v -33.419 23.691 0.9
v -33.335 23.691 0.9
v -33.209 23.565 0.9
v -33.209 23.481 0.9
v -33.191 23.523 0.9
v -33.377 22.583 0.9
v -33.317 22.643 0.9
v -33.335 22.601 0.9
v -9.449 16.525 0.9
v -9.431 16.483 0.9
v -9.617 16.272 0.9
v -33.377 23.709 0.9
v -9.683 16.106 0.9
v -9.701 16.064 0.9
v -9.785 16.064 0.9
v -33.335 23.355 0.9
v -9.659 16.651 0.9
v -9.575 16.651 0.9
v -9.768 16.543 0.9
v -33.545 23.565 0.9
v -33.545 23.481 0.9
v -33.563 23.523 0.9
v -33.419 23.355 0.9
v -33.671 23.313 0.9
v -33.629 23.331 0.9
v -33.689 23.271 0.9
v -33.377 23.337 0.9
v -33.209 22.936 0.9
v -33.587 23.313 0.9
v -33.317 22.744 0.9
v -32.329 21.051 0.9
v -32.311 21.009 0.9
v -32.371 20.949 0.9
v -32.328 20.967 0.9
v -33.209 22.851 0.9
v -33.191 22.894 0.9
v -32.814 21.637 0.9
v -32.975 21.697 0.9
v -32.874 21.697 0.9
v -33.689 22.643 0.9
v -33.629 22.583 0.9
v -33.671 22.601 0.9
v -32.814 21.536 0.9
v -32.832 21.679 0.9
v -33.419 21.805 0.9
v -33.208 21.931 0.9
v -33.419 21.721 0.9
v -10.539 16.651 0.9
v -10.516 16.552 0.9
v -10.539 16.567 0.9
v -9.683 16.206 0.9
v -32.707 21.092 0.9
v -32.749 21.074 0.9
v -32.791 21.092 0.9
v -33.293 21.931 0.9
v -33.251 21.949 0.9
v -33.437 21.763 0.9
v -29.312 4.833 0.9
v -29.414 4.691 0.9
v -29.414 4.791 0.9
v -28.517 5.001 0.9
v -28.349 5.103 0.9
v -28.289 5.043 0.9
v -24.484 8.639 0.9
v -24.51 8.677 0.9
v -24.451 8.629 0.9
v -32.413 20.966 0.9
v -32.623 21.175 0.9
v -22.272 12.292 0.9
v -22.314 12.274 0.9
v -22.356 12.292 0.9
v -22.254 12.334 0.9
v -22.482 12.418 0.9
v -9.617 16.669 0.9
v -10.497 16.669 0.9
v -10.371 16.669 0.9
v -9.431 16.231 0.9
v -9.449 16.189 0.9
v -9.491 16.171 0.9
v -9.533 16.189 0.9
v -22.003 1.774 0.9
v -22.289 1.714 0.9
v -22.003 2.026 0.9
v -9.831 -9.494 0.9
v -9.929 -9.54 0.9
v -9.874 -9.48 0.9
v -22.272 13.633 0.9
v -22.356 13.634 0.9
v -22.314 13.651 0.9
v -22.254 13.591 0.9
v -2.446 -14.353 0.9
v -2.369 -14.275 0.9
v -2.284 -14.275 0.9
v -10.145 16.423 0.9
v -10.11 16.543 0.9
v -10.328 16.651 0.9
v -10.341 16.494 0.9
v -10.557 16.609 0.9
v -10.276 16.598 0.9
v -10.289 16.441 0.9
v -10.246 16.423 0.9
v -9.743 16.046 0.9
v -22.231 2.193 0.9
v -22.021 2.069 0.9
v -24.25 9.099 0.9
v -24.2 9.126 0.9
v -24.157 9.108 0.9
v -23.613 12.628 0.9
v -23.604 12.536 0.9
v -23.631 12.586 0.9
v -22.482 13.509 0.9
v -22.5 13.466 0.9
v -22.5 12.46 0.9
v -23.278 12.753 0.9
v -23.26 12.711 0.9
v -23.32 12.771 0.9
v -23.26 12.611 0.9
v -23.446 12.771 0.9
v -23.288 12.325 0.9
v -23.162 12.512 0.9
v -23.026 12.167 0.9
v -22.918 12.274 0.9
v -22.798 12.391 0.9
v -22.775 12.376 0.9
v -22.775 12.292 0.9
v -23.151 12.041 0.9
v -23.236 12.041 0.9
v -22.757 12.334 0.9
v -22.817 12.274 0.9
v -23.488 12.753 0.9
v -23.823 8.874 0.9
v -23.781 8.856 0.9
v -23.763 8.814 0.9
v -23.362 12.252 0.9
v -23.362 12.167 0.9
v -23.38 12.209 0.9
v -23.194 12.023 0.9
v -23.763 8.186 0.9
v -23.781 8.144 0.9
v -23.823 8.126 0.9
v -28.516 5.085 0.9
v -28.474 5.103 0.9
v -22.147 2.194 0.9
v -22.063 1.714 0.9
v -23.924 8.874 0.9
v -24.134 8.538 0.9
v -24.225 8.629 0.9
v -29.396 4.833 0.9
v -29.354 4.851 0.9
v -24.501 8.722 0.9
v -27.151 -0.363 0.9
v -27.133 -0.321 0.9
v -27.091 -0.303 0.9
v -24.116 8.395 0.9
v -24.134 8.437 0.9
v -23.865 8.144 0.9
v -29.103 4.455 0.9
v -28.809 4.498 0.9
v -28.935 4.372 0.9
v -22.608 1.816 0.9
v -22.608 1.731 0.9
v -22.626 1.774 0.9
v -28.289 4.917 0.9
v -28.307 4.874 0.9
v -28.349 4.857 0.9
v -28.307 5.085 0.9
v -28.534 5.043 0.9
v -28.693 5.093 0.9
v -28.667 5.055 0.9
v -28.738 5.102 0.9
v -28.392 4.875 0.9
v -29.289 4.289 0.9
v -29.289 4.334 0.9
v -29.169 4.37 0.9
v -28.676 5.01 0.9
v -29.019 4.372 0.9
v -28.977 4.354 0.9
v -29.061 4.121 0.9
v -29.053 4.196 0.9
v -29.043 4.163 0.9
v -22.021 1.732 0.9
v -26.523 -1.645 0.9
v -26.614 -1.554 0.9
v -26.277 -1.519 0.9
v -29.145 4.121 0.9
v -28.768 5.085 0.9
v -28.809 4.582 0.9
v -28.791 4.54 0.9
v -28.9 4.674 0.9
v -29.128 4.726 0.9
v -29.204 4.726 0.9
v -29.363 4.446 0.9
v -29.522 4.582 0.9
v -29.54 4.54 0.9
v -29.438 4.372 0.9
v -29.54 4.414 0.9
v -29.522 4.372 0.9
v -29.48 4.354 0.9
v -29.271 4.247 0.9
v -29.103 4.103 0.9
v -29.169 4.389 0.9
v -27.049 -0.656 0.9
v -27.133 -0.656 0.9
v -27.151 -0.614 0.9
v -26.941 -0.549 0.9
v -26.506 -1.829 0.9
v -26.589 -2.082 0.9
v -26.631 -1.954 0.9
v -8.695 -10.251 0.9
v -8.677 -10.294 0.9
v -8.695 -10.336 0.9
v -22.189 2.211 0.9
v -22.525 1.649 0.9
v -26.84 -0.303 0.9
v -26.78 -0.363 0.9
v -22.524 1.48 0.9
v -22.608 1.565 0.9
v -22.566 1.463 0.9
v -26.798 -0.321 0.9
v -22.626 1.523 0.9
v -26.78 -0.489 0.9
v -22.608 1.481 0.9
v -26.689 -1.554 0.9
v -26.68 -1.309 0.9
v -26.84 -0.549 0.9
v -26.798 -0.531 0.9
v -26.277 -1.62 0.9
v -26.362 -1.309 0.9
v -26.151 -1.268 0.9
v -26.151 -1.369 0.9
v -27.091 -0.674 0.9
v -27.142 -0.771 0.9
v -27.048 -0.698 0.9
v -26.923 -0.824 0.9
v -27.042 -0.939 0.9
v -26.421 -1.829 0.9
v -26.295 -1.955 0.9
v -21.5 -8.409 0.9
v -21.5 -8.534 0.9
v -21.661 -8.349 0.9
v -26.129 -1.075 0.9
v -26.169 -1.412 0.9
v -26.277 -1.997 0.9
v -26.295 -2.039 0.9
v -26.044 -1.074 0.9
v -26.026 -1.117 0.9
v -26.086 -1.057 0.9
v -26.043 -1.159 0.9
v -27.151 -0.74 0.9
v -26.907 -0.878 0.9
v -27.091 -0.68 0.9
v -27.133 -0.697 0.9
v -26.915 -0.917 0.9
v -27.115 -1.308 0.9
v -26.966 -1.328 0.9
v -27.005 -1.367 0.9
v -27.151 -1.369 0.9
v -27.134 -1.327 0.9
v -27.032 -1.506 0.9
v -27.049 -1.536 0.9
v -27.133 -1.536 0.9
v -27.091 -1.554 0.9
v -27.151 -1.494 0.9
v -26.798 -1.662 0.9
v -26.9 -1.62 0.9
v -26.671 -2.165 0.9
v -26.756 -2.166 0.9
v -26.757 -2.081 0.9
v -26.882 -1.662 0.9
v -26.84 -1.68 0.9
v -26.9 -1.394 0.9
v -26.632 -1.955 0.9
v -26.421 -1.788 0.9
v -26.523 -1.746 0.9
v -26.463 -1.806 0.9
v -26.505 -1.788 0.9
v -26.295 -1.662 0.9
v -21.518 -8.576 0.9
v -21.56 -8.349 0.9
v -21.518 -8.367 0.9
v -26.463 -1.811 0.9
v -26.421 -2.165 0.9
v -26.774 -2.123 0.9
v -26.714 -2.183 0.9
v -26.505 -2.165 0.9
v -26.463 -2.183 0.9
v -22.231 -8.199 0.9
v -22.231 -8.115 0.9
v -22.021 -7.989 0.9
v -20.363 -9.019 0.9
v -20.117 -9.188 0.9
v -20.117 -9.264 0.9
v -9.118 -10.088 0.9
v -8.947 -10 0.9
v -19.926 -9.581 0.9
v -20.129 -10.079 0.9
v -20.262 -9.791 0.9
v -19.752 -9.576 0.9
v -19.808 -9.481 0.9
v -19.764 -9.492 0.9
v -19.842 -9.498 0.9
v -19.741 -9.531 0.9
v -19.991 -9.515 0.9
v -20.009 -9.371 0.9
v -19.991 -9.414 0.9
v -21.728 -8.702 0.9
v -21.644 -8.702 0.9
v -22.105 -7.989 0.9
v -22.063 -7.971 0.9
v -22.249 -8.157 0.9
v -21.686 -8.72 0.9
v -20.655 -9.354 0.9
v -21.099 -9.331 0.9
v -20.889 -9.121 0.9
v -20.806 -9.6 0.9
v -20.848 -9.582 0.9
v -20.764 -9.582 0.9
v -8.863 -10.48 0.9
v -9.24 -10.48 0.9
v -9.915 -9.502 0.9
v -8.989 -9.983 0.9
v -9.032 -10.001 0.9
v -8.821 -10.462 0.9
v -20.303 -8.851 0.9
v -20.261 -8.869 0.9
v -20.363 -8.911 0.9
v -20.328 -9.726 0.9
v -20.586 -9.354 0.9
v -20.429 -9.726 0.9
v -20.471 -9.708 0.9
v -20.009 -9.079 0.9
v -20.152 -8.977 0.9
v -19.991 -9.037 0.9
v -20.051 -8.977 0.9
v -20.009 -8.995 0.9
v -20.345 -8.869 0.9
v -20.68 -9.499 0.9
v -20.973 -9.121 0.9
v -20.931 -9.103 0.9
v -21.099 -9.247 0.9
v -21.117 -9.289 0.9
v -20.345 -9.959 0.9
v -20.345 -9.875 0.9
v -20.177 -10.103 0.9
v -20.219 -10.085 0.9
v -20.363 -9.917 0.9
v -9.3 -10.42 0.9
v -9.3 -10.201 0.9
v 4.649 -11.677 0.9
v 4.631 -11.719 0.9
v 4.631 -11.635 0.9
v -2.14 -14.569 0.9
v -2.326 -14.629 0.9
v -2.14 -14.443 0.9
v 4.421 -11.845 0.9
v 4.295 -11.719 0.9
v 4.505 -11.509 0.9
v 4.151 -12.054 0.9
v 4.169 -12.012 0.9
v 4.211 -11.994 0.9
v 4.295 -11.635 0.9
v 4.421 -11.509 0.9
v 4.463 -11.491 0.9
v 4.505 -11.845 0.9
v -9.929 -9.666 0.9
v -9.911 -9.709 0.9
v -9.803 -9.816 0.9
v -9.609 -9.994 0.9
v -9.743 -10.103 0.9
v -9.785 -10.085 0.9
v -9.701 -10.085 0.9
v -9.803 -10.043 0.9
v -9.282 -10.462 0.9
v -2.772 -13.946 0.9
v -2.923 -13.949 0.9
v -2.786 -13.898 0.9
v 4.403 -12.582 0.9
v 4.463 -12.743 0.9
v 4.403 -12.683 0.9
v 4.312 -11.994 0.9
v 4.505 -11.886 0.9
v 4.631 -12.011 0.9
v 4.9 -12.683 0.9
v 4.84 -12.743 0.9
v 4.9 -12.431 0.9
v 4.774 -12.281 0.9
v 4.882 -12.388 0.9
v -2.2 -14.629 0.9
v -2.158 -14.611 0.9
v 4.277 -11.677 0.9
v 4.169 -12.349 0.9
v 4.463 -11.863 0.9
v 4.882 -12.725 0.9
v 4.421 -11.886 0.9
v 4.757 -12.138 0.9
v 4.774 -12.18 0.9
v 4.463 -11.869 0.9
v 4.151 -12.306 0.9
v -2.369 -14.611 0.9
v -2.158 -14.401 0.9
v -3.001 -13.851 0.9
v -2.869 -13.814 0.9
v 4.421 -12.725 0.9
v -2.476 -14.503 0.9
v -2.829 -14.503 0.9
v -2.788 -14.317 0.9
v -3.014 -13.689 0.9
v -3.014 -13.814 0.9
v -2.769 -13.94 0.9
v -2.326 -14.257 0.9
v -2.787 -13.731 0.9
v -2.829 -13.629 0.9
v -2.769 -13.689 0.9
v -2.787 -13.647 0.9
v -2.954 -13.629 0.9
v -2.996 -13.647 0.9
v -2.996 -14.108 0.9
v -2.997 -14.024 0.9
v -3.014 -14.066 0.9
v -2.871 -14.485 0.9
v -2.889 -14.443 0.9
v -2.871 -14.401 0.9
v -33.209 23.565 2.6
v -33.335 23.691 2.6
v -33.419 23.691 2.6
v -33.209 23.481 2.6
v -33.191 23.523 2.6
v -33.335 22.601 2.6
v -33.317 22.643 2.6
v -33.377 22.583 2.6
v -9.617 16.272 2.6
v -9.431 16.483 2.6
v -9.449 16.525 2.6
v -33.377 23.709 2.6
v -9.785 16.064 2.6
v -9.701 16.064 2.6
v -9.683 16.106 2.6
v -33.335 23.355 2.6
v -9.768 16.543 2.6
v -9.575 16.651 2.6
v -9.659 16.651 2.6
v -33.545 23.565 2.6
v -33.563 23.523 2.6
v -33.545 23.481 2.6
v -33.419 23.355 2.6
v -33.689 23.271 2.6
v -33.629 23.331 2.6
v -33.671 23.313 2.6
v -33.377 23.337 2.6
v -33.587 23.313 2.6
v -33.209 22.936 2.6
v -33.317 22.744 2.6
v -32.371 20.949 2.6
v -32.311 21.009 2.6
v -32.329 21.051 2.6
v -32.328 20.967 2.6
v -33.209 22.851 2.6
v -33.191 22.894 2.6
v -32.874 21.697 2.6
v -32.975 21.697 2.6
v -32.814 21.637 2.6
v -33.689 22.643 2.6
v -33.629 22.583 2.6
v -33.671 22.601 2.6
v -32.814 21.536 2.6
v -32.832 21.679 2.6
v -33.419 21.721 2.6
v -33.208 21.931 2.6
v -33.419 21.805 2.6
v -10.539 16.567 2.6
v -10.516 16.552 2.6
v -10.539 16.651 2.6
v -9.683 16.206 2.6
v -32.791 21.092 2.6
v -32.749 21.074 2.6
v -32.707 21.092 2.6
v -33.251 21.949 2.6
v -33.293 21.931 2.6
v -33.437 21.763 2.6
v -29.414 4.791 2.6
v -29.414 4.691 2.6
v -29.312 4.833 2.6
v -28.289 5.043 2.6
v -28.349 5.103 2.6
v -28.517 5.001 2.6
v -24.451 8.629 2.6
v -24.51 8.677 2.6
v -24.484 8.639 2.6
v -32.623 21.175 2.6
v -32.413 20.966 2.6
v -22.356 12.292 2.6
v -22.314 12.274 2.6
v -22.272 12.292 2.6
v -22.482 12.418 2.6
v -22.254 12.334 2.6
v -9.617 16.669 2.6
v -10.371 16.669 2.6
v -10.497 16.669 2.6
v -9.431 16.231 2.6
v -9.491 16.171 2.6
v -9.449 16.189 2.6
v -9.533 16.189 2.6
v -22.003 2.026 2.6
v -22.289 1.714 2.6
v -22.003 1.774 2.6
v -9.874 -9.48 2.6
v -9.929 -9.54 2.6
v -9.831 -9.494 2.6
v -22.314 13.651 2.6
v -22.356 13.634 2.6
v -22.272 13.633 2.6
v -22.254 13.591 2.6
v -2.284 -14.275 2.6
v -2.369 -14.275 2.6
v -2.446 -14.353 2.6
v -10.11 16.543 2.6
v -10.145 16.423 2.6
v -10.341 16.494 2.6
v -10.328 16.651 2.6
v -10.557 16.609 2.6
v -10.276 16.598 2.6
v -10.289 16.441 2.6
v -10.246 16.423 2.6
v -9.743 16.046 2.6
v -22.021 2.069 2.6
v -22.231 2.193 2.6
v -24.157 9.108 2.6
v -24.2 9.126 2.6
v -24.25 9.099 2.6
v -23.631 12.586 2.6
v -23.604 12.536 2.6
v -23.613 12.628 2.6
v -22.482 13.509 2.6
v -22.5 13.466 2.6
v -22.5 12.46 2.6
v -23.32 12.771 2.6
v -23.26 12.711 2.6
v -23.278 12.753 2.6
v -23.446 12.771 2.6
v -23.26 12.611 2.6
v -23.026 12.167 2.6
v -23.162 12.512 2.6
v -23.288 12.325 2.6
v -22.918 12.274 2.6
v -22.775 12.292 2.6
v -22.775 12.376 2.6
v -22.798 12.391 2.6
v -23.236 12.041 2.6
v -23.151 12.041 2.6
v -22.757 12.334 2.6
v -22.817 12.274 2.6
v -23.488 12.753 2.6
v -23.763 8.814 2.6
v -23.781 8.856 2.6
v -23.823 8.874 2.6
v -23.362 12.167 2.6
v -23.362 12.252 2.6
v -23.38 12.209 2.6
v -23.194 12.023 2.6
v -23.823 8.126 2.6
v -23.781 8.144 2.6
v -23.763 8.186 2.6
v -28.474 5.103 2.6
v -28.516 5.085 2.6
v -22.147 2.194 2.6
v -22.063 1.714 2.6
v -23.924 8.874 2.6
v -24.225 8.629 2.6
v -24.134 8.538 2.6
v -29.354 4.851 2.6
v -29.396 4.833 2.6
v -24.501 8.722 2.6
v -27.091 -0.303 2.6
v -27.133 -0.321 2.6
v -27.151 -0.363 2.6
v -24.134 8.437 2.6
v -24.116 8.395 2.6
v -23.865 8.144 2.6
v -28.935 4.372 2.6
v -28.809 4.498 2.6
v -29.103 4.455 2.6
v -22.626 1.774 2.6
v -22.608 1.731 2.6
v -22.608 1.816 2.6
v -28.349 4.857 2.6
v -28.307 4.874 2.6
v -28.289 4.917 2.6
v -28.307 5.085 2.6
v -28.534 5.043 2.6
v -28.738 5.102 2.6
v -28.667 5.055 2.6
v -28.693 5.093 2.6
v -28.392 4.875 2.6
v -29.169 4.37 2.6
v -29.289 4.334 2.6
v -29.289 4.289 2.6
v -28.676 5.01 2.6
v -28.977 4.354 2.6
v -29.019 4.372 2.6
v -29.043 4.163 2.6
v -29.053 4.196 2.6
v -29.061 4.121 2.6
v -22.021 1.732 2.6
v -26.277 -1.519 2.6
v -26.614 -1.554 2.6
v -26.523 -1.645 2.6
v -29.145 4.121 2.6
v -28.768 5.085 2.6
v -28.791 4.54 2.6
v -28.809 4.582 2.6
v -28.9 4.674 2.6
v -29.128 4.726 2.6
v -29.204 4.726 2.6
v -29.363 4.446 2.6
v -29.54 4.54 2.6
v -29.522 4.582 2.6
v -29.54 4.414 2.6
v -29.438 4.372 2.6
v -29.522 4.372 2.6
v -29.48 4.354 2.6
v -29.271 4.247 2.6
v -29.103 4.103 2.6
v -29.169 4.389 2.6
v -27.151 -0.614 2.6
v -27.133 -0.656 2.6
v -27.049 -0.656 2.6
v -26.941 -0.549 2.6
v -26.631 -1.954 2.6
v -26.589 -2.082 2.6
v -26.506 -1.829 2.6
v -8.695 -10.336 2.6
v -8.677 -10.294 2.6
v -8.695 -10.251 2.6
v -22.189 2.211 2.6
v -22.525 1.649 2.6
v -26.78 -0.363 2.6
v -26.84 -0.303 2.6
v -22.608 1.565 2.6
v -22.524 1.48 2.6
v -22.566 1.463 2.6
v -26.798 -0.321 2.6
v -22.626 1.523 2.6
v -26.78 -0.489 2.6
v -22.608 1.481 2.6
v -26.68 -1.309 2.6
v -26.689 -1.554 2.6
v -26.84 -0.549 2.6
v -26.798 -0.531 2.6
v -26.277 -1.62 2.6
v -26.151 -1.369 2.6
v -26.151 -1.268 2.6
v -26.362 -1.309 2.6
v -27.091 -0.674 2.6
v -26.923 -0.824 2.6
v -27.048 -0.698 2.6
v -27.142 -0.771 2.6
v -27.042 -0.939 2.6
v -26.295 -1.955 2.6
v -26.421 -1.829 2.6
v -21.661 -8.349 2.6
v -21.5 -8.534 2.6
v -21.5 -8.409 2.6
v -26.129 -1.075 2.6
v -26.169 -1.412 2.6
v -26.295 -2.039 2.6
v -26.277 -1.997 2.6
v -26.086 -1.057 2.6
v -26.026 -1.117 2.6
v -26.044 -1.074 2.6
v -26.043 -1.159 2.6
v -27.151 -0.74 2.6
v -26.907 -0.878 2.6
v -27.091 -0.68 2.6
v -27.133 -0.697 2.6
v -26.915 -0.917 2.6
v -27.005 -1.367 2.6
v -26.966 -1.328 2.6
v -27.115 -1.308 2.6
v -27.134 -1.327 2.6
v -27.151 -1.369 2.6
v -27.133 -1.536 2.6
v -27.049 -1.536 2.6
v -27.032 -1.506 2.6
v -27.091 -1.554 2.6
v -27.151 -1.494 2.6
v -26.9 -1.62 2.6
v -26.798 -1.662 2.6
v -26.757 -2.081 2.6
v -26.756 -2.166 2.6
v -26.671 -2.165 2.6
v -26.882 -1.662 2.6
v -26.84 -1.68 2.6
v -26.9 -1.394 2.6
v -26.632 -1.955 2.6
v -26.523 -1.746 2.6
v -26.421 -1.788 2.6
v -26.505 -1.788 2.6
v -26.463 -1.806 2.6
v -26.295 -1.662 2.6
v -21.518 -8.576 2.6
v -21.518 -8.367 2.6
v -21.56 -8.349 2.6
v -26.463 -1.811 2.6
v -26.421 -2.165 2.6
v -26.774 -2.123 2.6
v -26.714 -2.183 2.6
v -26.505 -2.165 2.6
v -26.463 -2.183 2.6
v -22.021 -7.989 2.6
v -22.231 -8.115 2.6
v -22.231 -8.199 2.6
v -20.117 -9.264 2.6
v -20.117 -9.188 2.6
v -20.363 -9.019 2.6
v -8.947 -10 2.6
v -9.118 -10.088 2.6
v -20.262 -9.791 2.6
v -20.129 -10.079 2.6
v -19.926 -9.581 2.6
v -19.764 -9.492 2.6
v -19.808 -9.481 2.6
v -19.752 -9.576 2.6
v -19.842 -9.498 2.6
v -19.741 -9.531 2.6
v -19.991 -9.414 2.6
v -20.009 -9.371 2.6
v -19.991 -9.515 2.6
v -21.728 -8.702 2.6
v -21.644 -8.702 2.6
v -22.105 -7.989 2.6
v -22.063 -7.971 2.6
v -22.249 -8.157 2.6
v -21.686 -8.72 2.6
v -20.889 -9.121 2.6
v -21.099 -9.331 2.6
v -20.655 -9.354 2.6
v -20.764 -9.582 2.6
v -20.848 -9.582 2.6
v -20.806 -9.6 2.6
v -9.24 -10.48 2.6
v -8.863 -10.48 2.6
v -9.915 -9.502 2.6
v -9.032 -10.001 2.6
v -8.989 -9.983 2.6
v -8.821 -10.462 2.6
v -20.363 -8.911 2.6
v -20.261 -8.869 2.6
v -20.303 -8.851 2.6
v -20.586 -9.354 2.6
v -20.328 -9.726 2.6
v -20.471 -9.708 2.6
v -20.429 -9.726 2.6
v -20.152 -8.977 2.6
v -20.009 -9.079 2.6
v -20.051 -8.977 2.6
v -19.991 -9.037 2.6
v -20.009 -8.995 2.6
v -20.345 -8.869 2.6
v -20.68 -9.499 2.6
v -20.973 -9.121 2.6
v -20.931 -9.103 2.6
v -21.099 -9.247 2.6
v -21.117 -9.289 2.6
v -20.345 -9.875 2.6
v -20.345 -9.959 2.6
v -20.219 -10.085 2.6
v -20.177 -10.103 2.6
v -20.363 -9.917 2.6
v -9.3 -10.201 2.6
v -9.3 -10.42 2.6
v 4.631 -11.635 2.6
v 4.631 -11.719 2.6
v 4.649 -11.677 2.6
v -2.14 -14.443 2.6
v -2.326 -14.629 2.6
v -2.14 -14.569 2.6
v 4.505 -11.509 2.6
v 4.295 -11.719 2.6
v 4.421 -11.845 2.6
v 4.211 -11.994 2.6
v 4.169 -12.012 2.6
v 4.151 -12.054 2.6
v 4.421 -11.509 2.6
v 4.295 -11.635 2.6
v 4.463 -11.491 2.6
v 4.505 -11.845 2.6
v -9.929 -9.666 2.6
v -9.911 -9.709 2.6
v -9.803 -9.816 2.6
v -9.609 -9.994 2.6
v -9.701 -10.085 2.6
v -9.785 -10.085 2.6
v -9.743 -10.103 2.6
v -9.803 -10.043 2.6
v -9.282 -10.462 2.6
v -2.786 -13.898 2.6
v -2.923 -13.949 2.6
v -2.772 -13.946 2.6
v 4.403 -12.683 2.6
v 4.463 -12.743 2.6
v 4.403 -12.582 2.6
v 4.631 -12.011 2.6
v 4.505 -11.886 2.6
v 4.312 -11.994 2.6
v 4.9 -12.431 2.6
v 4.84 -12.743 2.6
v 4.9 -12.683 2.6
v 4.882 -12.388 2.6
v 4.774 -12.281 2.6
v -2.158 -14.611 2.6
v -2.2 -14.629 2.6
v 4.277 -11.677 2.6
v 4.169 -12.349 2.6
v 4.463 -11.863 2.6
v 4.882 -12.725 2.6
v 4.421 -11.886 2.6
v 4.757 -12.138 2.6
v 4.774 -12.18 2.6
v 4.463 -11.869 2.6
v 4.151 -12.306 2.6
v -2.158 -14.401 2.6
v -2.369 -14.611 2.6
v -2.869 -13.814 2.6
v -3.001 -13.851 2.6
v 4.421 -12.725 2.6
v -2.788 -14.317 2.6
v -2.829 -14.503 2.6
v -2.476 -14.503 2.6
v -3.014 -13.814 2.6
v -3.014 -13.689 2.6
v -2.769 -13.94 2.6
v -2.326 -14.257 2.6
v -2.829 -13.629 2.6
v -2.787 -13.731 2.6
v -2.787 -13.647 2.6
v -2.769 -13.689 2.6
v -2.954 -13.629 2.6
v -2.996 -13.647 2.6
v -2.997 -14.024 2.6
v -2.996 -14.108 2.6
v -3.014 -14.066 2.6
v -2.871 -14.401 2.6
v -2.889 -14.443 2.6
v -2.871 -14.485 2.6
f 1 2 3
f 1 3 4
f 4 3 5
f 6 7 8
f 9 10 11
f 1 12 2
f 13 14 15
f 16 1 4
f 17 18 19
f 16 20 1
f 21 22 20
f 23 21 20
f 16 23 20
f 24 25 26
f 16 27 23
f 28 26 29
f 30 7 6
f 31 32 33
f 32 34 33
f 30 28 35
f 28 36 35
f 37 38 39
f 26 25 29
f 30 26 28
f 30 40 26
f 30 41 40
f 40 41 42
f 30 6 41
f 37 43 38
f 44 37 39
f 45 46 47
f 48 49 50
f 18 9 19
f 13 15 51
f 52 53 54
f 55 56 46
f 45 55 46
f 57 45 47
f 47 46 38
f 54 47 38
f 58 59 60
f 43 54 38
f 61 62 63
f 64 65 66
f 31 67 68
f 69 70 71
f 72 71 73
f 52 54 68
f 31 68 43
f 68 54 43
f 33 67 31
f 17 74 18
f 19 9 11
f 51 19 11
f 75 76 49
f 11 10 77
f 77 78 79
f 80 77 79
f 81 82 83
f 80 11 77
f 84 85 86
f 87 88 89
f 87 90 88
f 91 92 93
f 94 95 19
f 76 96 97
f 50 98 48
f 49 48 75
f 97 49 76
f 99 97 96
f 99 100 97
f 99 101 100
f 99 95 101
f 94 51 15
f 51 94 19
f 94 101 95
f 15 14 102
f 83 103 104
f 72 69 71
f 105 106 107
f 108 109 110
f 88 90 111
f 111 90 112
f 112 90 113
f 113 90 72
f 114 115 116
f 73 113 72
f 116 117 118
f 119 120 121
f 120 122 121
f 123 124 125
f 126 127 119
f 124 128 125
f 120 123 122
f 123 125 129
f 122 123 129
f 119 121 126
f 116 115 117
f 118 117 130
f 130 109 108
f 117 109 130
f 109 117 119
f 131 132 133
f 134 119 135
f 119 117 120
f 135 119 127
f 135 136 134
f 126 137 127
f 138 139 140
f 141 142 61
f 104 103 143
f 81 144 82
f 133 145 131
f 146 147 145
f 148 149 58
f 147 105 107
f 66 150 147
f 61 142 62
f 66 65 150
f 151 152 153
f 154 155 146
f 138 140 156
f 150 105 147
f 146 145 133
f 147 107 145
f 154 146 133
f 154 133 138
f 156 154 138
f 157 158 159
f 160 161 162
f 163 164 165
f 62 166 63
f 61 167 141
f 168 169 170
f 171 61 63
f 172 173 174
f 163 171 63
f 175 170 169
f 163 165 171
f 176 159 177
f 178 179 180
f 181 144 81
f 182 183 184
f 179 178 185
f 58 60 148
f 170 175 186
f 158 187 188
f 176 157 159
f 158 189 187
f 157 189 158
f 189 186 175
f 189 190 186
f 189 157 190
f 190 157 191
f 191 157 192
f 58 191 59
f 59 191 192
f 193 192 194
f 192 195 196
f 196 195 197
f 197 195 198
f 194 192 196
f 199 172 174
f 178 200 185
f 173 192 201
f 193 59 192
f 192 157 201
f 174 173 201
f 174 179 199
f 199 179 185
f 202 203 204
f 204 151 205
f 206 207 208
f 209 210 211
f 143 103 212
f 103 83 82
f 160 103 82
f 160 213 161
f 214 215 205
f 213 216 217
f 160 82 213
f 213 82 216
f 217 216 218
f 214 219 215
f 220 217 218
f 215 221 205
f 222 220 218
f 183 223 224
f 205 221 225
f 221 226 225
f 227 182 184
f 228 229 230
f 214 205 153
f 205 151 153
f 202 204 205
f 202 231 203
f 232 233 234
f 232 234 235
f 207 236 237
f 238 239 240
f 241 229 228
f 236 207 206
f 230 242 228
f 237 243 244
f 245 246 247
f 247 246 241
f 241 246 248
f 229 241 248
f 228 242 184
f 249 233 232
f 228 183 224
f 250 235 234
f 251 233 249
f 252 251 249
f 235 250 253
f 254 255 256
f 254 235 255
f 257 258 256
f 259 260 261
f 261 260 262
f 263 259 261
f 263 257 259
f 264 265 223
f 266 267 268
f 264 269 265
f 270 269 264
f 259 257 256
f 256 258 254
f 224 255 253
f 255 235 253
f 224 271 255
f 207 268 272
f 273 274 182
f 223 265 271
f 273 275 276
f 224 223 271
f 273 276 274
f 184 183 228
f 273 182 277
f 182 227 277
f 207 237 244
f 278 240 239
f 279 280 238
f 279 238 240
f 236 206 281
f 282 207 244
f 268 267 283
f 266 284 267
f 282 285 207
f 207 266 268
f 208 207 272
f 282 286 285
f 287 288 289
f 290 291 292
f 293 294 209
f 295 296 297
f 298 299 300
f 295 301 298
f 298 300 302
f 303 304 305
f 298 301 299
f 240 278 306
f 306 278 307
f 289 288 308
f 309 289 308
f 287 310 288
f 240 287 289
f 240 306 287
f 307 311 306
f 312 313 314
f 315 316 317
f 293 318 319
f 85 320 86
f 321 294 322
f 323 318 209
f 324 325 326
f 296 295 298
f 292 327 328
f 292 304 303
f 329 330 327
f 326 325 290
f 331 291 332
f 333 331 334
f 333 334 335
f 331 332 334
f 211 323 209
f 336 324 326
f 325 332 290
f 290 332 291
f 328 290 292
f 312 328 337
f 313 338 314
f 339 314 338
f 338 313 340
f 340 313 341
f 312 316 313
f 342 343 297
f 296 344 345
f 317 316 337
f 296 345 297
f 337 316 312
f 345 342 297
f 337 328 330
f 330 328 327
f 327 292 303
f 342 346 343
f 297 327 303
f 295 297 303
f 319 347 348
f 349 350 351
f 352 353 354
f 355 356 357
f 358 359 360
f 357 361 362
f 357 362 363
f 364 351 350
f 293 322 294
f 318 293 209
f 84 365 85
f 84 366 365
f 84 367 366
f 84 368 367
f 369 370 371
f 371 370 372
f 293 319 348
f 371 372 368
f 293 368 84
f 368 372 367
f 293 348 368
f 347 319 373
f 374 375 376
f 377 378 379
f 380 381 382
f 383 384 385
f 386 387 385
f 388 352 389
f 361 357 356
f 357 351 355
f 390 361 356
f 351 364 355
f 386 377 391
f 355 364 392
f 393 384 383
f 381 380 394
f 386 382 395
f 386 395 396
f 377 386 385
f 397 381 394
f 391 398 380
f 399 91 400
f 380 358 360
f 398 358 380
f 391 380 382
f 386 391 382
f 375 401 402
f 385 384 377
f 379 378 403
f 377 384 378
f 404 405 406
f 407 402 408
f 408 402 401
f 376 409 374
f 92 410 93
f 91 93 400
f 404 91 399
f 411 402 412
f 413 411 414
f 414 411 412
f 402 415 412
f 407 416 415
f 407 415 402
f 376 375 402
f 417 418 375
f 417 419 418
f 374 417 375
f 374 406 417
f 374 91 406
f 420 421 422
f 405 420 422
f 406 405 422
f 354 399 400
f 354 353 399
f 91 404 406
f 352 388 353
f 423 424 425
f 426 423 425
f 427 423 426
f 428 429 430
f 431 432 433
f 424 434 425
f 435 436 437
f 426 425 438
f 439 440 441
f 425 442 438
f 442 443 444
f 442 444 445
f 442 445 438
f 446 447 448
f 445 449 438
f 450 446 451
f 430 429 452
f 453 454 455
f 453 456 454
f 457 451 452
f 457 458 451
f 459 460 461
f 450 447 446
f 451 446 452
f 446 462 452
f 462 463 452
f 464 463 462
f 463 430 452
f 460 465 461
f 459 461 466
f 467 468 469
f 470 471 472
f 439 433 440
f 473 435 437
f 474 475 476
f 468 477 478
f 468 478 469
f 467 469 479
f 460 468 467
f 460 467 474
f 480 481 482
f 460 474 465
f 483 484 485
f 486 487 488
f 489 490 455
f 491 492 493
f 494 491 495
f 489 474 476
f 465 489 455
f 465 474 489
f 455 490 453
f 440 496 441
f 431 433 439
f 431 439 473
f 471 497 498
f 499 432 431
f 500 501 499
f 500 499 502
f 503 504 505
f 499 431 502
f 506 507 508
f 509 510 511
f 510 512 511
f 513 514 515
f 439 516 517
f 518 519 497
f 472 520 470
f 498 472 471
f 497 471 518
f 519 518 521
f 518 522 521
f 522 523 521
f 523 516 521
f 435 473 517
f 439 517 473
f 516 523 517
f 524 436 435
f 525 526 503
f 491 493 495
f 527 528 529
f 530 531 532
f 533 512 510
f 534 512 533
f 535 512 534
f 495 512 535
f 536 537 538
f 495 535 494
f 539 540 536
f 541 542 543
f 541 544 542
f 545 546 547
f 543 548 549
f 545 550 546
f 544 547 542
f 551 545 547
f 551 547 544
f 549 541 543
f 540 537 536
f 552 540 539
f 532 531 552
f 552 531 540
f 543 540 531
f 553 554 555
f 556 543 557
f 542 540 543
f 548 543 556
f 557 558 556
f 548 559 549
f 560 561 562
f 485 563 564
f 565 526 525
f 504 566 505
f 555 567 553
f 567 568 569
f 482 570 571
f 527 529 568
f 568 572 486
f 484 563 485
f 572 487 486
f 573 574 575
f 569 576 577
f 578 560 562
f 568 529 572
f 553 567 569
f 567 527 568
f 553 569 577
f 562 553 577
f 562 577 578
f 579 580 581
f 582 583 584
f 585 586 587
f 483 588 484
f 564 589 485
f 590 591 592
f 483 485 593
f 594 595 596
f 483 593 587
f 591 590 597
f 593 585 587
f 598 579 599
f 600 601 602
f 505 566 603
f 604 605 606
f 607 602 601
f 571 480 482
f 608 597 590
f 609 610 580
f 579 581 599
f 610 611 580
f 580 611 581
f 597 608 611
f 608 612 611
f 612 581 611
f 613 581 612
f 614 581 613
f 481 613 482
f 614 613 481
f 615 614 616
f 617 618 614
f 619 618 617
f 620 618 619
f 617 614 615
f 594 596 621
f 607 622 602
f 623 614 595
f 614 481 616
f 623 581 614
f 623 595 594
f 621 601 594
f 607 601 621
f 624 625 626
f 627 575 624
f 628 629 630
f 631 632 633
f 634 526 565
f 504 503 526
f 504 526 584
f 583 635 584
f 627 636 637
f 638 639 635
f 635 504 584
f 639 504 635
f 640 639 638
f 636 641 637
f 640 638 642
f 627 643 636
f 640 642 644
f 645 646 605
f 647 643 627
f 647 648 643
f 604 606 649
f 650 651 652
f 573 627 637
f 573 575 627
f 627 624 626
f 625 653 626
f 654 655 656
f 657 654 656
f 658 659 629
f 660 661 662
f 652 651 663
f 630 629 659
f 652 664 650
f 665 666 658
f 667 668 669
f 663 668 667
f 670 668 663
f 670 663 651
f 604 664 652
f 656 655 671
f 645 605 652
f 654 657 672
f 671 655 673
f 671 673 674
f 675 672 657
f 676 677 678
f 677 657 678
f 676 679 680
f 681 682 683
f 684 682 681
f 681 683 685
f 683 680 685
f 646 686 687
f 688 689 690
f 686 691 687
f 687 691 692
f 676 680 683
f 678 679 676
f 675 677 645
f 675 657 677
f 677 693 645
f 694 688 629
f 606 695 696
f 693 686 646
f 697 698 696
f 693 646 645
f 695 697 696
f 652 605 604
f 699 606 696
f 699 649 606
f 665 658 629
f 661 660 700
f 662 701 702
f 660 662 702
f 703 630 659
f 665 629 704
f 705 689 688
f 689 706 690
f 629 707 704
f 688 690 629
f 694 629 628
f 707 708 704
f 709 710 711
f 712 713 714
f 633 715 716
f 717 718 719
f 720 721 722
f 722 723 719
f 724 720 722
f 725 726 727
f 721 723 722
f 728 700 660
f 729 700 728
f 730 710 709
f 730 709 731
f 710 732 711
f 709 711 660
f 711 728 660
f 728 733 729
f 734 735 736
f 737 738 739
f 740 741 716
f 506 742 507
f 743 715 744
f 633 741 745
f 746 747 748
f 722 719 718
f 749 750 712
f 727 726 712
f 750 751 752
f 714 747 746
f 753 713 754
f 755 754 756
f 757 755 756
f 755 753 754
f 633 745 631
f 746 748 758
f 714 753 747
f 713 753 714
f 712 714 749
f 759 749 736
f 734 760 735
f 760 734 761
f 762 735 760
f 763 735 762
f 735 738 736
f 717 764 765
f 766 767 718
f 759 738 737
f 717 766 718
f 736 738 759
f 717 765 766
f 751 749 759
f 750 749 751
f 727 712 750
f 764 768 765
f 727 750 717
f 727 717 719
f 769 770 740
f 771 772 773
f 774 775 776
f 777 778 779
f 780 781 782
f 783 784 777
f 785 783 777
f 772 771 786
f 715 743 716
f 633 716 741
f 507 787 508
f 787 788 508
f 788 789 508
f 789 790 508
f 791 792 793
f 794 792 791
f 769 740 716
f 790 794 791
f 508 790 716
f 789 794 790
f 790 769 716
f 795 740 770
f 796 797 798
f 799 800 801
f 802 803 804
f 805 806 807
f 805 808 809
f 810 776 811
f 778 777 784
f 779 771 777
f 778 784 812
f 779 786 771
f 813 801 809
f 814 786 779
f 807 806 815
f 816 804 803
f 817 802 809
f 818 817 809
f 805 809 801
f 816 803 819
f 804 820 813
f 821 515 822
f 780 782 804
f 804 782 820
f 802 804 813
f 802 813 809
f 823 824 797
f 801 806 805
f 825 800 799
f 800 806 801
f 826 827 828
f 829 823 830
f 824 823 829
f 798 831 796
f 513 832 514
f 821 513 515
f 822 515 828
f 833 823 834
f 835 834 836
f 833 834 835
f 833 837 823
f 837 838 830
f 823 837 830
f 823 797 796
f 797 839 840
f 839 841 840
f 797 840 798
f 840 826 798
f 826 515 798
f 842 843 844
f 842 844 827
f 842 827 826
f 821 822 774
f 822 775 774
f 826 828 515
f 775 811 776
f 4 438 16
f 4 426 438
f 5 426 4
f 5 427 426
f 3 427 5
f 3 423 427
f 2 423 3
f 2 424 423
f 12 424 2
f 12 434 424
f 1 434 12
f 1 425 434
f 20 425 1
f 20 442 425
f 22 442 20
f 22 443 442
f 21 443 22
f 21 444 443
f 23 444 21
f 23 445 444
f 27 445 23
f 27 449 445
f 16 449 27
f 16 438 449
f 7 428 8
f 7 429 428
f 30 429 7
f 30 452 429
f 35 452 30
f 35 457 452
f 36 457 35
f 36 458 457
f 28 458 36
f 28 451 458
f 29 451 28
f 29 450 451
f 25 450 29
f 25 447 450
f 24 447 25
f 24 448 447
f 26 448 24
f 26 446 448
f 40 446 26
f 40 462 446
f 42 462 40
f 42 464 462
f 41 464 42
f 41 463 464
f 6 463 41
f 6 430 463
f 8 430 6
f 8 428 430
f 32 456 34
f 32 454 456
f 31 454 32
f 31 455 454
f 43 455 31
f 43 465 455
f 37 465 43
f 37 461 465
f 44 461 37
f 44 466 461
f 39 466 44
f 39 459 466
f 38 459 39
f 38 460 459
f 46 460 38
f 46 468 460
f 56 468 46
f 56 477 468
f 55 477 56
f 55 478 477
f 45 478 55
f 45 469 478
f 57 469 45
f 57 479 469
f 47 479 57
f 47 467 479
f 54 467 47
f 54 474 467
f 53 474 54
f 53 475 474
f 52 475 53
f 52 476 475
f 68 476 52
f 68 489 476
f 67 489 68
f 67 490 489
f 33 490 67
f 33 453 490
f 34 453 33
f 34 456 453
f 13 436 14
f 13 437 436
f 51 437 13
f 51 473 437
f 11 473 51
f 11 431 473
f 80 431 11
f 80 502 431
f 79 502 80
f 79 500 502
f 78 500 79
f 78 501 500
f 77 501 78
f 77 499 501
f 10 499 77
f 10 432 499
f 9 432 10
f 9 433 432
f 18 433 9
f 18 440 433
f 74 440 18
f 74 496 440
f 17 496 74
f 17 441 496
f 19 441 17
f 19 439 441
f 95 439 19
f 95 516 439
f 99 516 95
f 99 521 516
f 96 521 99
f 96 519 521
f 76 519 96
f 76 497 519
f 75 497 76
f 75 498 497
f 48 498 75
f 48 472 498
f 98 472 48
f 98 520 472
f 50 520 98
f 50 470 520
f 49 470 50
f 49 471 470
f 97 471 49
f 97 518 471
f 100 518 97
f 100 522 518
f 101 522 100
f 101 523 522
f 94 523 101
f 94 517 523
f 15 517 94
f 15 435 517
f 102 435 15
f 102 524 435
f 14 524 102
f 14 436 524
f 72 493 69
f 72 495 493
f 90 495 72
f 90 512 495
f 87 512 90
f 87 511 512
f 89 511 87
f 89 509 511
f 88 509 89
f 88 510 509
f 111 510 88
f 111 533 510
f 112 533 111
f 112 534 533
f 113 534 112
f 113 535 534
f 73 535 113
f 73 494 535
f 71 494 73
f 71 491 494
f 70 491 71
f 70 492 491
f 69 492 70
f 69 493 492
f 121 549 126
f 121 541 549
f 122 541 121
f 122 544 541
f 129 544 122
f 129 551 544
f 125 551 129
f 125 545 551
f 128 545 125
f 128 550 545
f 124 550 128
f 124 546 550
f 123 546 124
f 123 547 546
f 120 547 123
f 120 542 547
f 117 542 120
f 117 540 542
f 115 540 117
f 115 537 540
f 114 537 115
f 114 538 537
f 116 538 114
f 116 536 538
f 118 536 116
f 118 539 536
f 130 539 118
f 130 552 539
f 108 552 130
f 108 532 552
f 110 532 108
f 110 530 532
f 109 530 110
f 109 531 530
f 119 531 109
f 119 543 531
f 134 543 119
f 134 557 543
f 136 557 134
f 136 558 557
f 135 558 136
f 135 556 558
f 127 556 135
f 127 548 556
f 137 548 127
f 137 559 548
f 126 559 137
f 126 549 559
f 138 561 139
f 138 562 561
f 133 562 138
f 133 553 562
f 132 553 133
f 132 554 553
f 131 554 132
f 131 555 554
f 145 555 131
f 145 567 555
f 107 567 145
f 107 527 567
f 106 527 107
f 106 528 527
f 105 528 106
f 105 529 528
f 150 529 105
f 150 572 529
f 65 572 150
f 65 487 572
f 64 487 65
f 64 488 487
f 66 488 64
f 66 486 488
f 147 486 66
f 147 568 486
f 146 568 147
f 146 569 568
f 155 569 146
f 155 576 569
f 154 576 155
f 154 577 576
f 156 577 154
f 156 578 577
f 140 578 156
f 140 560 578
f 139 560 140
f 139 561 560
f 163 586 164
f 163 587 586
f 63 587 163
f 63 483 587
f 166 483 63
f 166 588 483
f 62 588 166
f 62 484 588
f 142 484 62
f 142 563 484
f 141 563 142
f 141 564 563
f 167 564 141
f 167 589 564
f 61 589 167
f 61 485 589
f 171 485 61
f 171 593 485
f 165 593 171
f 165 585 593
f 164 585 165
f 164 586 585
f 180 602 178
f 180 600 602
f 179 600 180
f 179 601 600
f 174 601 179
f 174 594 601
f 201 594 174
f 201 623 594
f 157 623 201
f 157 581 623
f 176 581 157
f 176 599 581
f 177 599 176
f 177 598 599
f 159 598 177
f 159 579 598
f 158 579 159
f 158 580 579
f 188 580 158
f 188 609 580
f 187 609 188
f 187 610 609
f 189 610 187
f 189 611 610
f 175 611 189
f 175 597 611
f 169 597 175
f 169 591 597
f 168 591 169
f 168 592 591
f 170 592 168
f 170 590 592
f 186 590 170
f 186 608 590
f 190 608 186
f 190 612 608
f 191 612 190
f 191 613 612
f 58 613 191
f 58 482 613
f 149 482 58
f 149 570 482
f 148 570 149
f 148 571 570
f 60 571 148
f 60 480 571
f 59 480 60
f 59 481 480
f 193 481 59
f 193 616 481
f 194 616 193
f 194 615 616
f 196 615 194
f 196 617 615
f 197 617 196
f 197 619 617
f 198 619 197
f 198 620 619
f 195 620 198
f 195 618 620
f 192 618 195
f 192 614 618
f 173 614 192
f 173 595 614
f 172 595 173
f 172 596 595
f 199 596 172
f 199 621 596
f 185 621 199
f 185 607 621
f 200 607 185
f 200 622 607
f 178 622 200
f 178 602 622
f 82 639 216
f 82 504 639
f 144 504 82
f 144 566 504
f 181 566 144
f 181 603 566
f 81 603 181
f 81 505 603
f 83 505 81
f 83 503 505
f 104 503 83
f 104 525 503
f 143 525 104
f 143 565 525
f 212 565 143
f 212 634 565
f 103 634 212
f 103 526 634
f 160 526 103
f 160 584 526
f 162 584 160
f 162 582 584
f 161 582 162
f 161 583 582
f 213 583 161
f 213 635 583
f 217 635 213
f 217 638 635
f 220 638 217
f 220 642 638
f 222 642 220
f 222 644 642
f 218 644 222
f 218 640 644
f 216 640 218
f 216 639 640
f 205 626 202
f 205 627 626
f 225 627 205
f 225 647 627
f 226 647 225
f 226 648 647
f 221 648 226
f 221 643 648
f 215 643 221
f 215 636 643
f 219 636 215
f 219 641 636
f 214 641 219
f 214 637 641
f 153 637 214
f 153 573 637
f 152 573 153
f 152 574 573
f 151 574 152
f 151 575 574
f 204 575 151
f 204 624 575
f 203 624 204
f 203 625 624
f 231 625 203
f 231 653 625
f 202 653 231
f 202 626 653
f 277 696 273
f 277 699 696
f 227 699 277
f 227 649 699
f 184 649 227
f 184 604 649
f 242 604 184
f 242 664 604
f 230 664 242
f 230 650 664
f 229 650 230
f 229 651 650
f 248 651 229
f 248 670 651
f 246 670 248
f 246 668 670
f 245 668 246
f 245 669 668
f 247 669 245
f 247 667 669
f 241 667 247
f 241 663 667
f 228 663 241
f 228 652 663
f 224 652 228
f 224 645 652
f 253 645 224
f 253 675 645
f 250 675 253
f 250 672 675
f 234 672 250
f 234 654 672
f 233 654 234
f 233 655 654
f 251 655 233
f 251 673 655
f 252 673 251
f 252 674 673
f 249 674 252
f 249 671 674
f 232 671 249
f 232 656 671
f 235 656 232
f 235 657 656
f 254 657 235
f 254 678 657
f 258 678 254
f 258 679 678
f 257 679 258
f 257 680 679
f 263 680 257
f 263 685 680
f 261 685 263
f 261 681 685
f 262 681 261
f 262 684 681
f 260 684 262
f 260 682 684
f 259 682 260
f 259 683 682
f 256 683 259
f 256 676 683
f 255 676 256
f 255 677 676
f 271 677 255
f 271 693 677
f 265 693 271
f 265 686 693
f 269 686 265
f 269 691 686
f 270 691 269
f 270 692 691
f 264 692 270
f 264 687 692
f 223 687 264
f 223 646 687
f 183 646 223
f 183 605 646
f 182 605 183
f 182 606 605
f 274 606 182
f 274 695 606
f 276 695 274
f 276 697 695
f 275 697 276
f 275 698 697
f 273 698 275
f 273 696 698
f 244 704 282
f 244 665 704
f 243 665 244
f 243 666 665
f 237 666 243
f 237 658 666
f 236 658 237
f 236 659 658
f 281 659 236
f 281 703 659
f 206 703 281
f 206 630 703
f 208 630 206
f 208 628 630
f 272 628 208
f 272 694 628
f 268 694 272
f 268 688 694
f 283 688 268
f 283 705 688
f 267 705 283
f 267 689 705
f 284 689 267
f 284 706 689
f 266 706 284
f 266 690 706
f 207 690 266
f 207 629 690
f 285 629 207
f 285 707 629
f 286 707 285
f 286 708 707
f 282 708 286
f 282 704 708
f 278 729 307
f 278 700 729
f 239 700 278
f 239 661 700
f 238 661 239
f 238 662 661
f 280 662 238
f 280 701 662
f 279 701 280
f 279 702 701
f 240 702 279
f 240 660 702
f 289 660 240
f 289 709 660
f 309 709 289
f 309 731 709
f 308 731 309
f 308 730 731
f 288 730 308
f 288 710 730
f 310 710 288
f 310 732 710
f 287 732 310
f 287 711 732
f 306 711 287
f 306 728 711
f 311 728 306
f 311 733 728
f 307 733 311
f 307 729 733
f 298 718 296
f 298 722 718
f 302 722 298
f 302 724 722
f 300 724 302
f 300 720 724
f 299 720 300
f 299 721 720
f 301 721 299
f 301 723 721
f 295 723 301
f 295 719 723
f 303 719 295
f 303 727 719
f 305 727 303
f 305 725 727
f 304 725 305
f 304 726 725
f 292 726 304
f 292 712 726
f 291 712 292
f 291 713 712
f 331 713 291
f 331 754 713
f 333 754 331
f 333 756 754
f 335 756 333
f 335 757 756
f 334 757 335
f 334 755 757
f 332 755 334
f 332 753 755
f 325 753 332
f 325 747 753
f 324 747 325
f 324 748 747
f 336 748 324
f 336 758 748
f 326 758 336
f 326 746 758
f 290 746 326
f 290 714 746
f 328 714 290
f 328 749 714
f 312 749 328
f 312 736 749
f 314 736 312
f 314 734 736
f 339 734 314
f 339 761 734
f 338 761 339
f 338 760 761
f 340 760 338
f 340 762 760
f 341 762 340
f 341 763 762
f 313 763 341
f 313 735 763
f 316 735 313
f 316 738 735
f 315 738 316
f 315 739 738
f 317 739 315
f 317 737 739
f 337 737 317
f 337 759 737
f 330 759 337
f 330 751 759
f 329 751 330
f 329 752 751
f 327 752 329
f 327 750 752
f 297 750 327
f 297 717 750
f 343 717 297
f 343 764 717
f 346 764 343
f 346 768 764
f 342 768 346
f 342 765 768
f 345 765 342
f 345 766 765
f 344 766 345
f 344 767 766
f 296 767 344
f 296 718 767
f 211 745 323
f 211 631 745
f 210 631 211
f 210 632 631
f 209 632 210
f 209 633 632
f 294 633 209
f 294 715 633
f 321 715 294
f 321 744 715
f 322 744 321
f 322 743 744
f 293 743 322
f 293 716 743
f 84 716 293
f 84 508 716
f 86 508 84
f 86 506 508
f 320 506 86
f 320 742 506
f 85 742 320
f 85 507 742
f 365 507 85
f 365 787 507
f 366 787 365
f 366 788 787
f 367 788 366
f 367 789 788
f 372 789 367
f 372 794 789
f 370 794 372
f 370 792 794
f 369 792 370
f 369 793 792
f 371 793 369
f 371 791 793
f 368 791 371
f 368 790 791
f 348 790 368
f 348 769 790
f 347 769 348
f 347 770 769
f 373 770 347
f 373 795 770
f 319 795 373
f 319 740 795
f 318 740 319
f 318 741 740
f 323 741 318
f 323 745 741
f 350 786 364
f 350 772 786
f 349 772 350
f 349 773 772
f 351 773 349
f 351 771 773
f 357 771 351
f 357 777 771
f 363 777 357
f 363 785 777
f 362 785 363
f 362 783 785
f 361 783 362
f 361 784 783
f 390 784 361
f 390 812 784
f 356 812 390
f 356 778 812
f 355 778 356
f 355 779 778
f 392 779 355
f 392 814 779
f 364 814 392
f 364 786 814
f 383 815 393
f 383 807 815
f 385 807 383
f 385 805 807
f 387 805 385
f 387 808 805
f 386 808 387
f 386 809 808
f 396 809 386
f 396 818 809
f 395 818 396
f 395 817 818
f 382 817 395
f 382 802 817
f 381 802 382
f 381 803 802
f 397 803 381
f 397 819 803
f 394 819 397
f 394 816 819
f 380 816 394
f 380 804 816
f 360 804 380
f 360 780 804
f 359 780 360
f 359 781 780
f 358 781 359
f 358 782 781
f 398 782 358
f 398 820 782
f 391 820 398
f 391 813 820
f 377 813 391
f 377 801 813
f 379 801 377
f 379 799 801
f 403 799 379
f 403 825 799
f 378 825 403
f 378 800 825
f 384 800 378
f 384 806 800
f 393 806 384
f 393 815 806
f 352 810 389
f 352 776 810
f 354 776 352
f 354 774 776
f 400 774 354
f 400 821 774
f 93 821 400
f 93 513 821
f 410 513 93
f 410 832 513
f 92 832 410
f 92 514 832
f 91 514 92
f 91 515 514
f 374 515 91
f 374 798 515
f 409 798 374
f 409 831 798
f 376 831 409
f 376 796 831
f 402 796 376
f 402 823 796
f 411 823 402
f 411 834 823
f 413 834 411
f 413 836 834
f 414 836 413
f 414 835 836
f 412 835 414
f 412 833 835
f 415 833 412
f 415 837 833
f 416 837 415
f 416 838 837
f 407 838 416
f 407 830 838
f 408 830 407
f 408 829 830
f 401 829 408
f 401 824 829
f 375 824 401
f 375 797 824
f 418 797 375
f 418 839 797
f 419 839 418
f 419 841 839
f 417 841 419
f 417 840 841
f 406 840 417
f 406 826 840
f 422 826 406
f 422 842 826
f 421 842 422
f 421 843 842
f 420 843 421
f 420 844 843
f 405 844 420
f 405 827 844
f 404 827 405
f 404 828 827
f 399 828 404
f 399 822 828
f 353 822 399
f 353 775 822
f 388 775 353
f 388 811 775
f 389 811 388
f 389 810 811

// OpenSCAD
$fn = 24;
translate([0, -2.500, 0.900])
  linear_extrude(height=1.700) {
offset(r=0.06, $fn=8) {
    polygon(points=[[-2.954,-11.189],[-2.954,-11.314],[-2.829,-11.440],[-2.954,-11.566],[-2.703,-11.817],[-2.829,-11.943],[-3.331,-11.943],[-2.451,-11.943],[-2.326,-12.069],[-2.200,-12.069],[-2.200,-11.943],[-2.326,-11.817],[-2.451,-11.943],[-2.954,-11.314],[-2.829,-11.189],[-2.703,-11.189]], paths=[[0,1,2,3,4,5,6,7,8,9,10,11,12,13,14,15]]);
    polygon(points=[[4.463,-9.051],[4.337,-9.177],[4.463,-9.303],[4.463,-9.429],[4.337,-9.554],[4.211,-9.554],[4.211,-9.806],[4.463,-10.057],[4.463,-10.183],[4.840,-10.183],[4.840,-9.931],[4.966,-9.806],[4.840,-9.931],[4.714,-9.806],[4.714,-9.680],[4.589,-9.554],[4.714,-9.429],[4.589,-9.554],[4.463,-9.429],[4.463,-9.303],[4.589,-9.177]], paths=[[0,1,2,3,4,5,6,7,8,9,10,11,12,13,14,15,16,17,18,19,20]]);
    polygon(points=[[-9.869,-7.040],[-9.869,-7.166],[-9.994,-7.291],[-9.869,-7.166],[-9.743,-7.291],[-9.743,-7.543],[-9.869,-7.669],[-9.869,-7.794],[-9.869,-7.669],[-9.617,-7.417],[-9.240,-7.669],[-9.240,-7.920],[-8.863,-7.920],[-8.737,-7.794],[-8.989,-7.543],[-9.114,-7.669]], paths=[[0,1,2,3,4,5,6,7,8,9,10,11,12,13,14,15]]);
    polygon(points=[[-20.303,-5.909],[-20.429,-6.034],[-20.429,-6.160],[-20.303,-6.286],[-20.303,-6.537],[-20.554,-6.914],[-20.680,-6.914],[-20.931,-6.663],[-21.057,-6.789],[-21.183,-6.663],[-20.806,-7.040],[-20.680,-6.914],[-20.429,-7.166],[-20.303,-7.166],[-20.177,-7.291],[-20.303,-7.417],[-20.051,-7.669],[-20.177,-7.543],[-19.800,-7.040],[-19.926,-7.166],[-20.051,-7.040],[-20.051,-6.914],[-19.926,-6.789],[-20.051,-6.914],[-20.177,-6.789],[-20.177,-6.663],[-20.051,-6.537],[-20.177,-6.537],[-20.303,-6.411],[-20.303,-6.286],[-20.177,-6.160],[-20.303,-6.286],[-20.429,-6.160],[-20.429,-6.034]], paths=[[0,1,2,3,4,5,6,7,8,9,10,11,12,13,14,15,16,17,18,19,20,21,22,23,24,25,26,27,28,29,30,31,32,33]]);
    polygon(points=[[-22.189,-5.657],[-21.686,-6.160],[-21.560,-6.034],[-21.434,-6.160],[-21.560,-6.034],[-21.560,-5.909],[-21.686,-5.909],[-22.063,-5.531]], paths=[[0,1,2,3,4,5,6,7]]);
    polygon(points=[[-27.217,2.389],[-27.217,2.263],[-27.091,2.137],[-27.091,1.760],[-27.217,1.634],[-27.091,1.760],[-26.966,1.634],[-27.091,1.006],[-27.091,1.131],[-26.966,1.257],[-26.840,1.131],[-26.840,0.754],[-26.840,0.880],[-26.714,1.006],[-26.589,1.006],[-26.463,0.880],[-26.463,0.629],[-26.714,0.377],[-26.714,0.251],[-26.714,0.377],[-26.589,0.503],[-26.463,0.377],[-26.337,0.503],[-26.463,0.629],[-26.463,0.754],[-26.337,0.880],[-26.211,0.754],[-26.337,0.880],[-26.337,1.006],[-26.211,1.131],[-26.086,1.006],[-26.211,1.131],[-26.211,1.257],[-26.086,1.383],[-25.960,1.257],[-26.086,1.383],[-26.086,1.509],[-26.086,1.383],[-26.337,1.131],[-26.714,1.131],[-27.091,1.760],[-27.091,1.886],[-26.966,2.011],[-26.840,2.011],[-26.840,2.137],[-27.091,2.137],[-27.217,2.263]], paths=[[0,1,2,3,4,5,6,7,8,9,10,11,12,13,14,15,16,17,18,19,20,21,22,23,24,25,26,27,28,29,30,31,32,33,34,35,36,37,38,39,40,41,42,43,44,45,46]]);
    polygon(points=[[-21.811,5.029],[-22.566,4.274],[-22.440,4.149],[-22.566,4.023],[-22.314,4.274],[-22.063,4.274],[-22.063,4.526],[-22.189,4.651],[-21.937,4.903],[-21.811,4.777],[-21.811,4.651],[-21.811,4.777],[-21.937,4.903]], paths=[[0,1,2,3,4,5,6,7,8,9,10,11,12]]);
    polygon(points=[[-29.354,7.417],[-29.354,7.166],[-29.480,7.040],[-29.480,6.663],[-29.480,6.914],[-29.354,7.040],[-29.103,6.663],[-29.229,6.789],[-29.229,6.914],[-29.103,7.040],[-28.977,6.914],[-28.851,7.040],[-28.977,7.166],[-28.726,7.543],[-28.600,7.417],[-28.474,7.543],[-28.349,7.417],[-28.349,6.034],[-28.349,7.543],[-28.474,7.543],[-28.600,7.417],[-28.726,7.543],[-29.103,7.166],[-29.229,7.166],[-29.354,7.291]], paths=[[0,1,2,3,4,5,6,7,8,9,10,11,12,13,14,15,16,17,18,19,20,21,22,23,24]]);
    polygon(points=[[-24.200,11.566],[-24.451,11.189],[-24.577,11.314],[-24.451,11.189],[-24.200,11.189],[-24.074,11.063],[-24.074,10.937],[-23.823,10.686],[-23.823,10.434],[-23.823,11.314],[-23.949,11.314]], paths=[[0,1,2,3,4,5,6,7,8,9,10]]);
    polygon(points=[[-23.446,15.211],[-23.571,15.086],[-23.194,14.834],[-23.320,14.709],[-23.194,14.583],[-23.069,14.709],[-22.943,14.583],[-22.943,14.457],[-23.069,14.331],[-22.943,14.457],[-22.943,14.583],[-23.069,14.709],[-22.943,14.834],[-22.817,14.834],[-23.194,14.960],[-23.320,15.086],[-23.320,15.211]], paths=[[0,1,2,3,4,5,6,7,8,9,10,11,12,13,14,15,16]]);
    polygon(points=[[-22.314,16.343],[-22.314,16.091],[-22.440,15.966],[-22.440,14.960],[-22.314,14.834],[-22.314,14.457],[-22.189,14.331],[-22.189,14.080],[-22.189,14.331],[-22.314,14.457]], paths=[[0,1,2,3,4,5,6,7,8,9]]);
    polygon(points=[[-10.497,19.109],[-10.120,18.983],[-9.743,18.606],[-9.869,18.480],[-9.743,18.606],[-9.617,18.480],[-9.743,18.606],[-9.743,18.731],[-9.617,18.857],[-9.491,18.731],[-9.491,18.983],[-9.617,19.109],[-9.743,18.983],[-10.246,18.983],[-10.371,19.109]], paths=[[0,1,2,3,4,5,6,7,8,9,10,11,12,13,14]]);
    polygon(points=[[-33.377,24.263],[-32.749,23.634],[-32.623,23.760],[-32.371,23.509],[-32.874,24.011],[-32.874,24.137],[-33.000,24.137],[-33.251,24.389]], paths=[[0,1,2,3,4,5,6,7]]);
    polygon(points=[[-33.377,26.149],[-33.629,25.897],[-33.754,26.023],[-33.754,26.149],[-33.754,26.023],[-33.629,25.897],[-33.629,25.143],[-33.754,25.017],[-33.754,24.891],[-33.754,25.017],[-33.629,25.143],[-33.377,25.143],[-33.377,25.269],[-33.251,25.394],[-33.629,25.771],[-33.629,25.897],[-33.503,26.023],[-33.377,25.897],[-33.251,26.023]], paths=[[0,1,2,3,4,5,6,7,8,9,10,11,12,13,14,15,16,17,18]]);
}
}
